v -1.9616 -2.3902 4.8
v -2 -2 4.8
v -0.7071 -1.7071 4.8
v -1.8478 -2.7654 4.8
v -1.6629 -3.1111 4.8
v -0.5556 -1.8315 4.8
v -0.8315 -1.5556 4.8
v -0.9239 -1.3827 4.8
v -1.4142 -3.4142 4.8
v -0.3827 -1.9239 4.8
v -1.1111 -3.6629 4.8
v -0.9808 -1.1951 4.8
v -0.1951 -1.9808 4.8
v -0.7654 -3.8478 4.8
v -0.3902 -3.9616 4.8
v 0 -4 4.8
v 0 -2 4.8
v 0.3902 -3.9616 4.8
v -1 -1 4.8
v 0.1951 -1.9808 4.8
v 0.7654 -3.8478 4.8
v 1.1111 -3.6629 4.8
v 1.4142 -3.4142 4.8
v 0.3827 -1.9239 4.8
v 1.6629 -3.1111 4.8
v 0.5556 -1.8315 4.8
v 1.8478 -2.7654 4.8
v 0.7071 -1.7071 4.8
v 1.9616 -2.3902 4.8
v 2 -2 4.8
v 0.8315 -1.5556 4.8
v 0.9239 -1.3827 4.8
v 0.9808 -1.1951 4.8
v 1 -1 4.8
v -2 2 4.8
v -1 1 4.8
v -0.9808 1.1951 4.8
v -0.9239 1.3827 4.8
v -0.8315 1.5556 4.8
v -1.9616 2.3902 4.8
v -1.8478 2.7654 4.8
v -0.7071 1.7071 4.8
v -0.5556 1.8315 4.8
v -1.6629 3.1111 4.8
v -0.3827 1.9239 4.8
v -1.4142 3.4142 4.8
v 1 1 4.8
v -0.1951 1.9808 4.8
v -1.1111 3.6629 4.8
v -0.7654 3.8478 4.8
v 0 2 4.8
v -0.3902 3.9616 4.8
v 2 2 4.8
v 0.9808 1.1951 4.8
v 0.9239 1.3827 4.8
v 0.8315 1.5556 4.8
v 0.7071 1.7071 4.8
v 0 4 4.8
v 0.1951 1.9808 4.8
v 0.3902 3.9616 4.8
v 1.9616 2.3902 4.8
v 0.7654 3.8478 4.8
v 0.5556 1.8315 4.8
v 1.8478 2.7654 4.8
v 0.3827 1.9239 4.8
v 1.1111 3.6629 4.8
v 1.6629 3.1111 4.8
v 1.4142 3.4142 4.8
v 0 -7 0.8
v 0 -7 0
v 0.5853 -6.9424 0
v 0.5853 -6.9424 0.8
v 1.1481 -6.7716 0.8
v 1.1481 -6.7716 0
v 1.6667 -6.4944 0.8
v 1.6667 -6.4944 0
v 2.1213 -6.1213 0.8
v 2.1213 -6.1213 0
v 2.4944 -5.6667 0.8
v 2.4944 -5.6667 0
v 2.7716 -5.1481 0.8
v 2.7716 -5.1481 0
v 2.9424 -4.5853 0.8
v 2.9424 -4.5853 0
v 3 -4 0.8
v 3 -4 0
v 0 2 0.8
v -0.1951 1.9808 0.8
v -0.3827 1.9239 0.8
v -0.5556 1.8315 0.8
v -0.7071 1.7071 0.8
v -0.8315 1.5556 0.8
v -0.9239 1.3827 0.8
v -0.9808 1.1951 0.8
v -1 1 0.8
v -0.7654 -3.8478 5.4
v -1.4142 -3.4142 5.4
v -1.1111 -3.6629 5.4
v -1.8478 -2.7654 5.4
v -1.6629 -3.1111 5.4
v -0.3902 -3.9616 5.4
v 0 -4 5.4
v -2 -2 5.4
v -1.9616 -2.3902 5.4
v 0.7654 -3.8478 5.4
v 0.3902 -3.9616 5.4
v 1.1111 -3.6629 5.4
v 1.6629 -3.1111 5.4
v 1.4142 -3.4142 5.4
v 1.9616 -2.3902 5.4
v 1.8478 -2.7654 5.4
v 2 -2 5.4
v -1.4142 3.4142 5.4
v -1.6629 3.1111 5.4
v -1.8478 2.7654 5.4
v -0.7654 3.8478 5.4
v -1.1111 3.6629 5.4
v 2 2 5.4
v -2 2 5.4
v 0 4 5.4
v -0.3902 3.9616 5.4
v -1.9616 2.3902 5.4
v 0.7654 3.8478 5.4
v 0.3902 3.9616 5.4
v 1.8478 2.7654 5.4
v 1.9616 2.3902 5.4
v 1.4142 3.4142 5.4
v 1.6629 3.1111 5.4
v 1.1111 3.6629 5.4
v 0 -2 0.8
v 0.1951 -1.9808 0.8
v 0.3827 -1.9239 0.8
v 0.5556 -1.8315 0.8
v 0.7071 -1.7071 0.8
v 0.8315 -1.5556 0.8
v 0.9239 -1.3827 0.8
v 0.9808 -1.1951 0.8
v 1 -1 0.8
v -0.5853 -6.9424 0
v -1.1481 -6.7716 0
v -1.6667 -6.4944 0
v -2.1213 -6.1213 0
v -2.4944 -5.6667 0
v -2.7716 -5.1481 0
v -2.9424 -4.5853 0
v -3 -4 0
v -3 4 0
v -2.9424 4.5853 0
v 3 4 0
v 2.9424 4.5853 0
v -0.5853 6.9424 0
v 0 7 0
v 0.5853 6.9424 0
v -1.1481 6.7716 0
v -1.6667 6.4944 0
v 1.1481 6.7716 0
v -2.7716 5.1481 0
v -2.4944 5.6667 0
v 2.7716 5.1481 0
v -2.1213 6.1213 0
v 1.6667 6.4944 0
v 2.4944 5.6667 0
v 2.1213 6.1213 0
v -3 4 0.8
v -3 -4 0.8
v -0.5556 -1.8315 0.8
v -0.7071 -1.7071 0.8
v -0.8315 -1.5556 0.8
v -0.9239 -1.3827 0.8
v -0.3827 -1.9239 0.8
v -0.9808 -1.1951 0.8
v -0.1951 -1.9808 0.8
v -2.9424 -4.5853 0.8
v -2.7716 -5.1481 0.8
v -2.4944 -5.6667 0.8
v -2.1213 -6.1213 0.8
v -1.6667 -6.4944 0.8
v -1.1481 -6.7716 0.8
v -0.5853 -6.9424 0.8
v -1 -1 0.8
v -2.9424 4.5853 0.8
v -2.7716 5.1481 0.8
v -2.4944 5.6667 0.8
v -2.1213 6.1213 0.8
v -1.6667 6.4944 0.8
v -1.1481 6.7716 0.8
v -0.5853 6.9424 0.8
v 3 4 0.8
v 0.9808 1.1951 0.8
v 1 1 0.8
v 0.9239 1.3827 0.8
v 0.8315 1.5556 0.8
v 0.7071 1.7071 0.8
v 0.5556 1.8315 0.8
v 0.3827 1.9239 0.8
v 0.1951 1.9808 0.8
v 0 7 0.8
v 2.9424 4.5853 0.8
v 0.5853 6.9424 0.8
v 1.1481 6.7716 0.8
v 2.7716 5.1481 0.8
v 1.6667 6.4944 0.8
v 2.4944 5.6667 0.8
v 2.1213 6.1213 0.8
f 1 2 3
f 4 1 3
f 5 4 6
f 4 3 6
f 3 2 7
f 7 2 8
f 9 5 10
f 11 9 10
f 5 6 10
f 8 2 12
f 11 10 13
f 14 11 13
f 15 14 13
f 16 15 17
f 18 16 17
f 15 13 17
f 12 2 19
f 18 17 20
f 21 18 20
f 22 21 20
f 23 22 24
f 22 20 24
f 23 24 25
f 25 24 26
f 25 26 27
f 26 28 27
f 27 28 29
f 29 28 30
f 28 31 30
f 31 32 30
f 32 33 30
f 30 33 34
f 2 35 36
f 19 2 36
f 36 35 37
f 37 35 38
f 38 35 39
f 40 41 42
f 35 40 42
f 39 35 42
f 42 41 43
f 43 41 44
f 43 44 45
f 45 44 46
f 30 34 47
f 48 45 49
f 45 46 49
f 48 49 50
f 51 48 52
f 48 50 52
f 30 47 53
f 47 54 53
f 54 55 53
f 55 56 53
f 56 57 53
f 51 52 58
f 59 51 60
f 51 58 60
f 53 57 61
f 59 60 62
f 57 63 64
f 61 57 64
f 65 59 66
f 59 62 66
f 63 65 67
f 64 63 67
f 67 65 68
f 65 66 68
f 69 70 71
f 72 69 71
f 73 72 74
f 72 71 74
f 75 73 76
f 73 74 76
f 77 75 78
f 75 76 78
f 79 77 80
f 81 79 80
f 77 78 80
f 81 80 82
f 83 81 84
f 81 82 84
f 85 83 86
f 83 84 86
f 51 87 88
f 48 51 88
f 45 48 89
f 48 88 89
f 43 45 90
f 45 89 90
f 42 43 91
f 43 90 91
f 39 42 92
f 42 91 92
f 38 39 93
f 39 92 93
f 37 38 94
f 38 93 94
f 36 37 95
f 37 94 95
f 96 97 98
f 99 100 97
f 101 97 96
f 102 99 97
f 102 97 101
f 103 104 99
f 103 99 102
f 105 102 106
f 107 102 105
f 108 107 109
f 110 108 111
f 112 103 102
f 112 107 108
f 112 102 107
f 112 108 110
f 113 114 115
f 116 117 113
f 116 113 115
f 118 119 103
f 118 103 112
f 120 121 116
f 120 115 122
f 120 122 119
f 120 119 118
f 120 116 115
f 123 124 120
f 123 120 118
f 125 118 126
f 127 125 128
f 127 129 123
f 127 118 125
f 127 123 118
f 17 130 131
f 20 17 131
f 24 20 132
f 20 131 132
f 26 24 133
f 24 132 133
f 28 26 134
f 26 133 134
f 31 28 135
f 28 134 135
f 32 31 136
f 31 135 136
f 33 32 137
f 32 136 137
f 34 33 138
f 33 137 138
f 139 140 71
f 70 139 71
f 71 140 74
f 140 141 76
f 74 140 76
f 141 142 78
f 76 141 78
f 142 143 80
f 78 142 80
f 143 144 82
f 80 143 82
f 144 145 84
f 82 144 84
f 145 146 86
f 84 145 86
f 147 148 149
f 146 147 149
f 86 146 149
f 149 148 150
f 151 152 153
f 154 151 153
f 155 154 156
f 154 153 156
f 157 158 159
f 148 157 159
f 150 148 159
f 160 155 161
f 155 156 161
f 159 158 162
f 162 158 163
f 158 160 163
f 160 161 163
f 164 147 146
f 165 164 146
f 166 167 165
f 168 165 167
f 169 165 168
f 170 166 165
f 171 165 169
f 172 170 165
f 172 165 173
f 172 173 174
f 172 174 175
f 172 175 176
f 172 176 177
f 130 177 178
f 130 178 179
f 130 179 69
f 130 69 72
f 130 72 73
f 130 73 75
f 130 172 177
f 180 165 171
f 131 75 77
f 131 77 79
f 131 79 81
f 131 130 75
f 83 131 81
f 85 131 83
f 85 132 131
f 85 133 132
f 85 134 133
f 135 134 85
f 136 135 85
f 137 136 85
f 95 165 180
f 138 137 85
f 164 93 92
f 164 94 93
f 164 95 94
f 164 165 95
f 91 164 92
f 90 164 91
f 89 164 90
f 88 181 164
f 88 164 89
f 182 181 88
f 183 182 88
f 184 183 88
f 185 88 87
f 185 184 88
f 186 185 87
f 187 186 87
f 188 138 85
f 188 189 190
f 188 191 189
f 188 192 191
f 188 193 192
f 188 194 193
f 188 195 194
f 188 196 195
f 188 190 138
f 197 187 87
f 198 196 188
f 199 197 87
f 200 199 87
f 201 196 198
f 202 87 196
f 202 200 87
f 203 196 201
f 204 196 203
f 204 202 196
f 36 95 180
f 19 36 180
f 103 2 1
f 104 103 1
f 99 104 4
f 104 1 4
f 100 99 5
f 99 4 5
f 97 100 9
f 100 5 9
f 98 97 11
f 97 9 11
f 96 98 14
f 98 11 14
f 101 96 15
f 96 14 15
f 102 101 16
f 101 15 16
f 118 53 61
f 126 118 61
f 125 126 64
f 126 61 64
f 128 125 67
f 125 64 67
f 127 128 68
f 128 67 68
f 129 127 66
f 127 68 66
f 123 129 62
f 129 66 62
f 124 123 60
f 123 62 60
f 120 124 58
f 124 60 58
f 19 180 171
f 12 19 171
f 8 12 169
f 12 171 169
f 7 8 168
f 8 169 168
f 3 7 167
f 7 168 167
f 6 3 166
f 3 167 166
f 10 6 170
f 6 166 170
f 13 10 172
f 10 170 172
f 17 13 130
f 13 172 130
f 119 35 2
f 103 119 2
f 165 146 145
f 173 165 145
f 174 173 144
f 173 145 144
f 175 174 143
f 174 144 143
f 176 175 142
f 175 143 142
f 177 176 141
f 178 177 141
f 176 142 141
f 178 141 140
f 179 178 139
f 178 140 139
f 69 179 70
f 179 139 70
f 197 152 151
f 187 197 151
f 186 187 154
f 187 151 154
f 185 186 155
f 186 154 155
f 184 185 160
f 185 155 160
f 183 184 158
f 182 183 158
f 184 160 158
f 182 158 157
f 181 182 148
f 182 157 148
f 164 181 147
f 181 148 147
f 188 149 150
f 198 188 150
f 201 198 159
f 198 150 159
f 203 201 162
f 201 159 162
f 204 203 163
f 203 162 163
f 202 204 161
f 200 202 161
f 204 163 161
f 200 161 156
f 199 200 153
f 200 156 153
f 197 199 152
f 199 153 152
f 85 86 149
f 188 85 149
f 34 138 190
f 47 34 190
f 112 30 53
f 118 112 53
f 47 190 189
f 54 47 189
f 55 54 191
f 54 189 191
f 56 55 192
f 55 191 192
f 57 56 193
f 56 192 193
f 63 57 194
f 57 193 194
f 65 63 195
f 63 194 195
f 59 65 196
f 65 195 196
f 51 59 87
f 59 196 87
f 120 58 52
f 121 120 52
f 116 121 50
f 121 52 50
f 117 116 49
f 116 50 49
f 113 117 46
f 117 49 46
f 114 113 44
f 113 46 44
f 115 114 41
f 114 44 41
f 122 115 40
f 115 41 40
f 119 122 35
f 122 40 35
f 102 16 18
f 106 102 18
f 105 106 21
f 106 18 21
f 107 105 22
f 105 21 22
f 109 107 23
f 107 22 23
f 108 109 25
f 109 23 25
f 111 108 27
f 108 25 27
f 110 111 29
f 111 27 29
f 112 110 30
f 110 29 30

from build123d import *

# Parameters (mm, degrees)
F1_DEPTH = 0.8
F3_DEPTH = 4
F5_DEPTH = 0.6


with BuildPart() as f1:
    # F0 (on Top) → F1 (new body)
    with BuildSketch(Plane.XY):
        with BuildLine():
            ThreePointArc((0, 7), (-2.12132, 6.12132), (-3, 4))
            Line((-3, 4), (-3, -4))
            ThreePointArc((-3, -4), (-2.12132, -6.12132), (0, -7))
            ThreePointArc((0, -7), (2.12132, -6.12132), (3, -4))
            Line((3, -4), (3, 4))
            ThreePointArc((3, 4), (2.12132, 6.12132), (0, 7))
        make_face()
    extrude(amount=F1_DEPTH)

    # F2 (on face) → F3 (join)
    with BuildSketch(Plane.XY.offset(0.8)):
        with BuildLine():
            ThreePointArc((0, 2), (-0.707107, 1.707107), (-1, 1))
            Line((-1, 1), (-1, -1))
            ThreePointArc((-1, -1), (-0.707107, -1.707107), (0, -2))
            ThreePointArc((0, -2), (0.707107, -1.707107), (1, -1))
            Line((1, -1), (1, 1))
            ThreePointArc((1, 1), (0.707107, 1.707107), (0, 2))
        make_face()
    extrude(amount=F3_DEPTH)

    # F4 (on face) → F5 (join)
    with BuildSketch(Plane.XY.offset(4.8)):
        with BuildLine():
            ThreePointArc((0, 4), (-1.414214, 3.414214), (-2, 2))
            Line((-2, 2), (-2, -2))
            ThreePointArc((-2, -2), (-1.414214, -3.414214), (0, -4))
            ThreePointArc((0, -4), (1.414214, -3.414214), (2, -2))
            Line((2, -2), (2, 2))
            ThreePointArc((2, 2), (1.414214, 3.414214), (0, 4))
        make_face()
    extrude(amount=F5_DEPTH)


solid = f1.part
